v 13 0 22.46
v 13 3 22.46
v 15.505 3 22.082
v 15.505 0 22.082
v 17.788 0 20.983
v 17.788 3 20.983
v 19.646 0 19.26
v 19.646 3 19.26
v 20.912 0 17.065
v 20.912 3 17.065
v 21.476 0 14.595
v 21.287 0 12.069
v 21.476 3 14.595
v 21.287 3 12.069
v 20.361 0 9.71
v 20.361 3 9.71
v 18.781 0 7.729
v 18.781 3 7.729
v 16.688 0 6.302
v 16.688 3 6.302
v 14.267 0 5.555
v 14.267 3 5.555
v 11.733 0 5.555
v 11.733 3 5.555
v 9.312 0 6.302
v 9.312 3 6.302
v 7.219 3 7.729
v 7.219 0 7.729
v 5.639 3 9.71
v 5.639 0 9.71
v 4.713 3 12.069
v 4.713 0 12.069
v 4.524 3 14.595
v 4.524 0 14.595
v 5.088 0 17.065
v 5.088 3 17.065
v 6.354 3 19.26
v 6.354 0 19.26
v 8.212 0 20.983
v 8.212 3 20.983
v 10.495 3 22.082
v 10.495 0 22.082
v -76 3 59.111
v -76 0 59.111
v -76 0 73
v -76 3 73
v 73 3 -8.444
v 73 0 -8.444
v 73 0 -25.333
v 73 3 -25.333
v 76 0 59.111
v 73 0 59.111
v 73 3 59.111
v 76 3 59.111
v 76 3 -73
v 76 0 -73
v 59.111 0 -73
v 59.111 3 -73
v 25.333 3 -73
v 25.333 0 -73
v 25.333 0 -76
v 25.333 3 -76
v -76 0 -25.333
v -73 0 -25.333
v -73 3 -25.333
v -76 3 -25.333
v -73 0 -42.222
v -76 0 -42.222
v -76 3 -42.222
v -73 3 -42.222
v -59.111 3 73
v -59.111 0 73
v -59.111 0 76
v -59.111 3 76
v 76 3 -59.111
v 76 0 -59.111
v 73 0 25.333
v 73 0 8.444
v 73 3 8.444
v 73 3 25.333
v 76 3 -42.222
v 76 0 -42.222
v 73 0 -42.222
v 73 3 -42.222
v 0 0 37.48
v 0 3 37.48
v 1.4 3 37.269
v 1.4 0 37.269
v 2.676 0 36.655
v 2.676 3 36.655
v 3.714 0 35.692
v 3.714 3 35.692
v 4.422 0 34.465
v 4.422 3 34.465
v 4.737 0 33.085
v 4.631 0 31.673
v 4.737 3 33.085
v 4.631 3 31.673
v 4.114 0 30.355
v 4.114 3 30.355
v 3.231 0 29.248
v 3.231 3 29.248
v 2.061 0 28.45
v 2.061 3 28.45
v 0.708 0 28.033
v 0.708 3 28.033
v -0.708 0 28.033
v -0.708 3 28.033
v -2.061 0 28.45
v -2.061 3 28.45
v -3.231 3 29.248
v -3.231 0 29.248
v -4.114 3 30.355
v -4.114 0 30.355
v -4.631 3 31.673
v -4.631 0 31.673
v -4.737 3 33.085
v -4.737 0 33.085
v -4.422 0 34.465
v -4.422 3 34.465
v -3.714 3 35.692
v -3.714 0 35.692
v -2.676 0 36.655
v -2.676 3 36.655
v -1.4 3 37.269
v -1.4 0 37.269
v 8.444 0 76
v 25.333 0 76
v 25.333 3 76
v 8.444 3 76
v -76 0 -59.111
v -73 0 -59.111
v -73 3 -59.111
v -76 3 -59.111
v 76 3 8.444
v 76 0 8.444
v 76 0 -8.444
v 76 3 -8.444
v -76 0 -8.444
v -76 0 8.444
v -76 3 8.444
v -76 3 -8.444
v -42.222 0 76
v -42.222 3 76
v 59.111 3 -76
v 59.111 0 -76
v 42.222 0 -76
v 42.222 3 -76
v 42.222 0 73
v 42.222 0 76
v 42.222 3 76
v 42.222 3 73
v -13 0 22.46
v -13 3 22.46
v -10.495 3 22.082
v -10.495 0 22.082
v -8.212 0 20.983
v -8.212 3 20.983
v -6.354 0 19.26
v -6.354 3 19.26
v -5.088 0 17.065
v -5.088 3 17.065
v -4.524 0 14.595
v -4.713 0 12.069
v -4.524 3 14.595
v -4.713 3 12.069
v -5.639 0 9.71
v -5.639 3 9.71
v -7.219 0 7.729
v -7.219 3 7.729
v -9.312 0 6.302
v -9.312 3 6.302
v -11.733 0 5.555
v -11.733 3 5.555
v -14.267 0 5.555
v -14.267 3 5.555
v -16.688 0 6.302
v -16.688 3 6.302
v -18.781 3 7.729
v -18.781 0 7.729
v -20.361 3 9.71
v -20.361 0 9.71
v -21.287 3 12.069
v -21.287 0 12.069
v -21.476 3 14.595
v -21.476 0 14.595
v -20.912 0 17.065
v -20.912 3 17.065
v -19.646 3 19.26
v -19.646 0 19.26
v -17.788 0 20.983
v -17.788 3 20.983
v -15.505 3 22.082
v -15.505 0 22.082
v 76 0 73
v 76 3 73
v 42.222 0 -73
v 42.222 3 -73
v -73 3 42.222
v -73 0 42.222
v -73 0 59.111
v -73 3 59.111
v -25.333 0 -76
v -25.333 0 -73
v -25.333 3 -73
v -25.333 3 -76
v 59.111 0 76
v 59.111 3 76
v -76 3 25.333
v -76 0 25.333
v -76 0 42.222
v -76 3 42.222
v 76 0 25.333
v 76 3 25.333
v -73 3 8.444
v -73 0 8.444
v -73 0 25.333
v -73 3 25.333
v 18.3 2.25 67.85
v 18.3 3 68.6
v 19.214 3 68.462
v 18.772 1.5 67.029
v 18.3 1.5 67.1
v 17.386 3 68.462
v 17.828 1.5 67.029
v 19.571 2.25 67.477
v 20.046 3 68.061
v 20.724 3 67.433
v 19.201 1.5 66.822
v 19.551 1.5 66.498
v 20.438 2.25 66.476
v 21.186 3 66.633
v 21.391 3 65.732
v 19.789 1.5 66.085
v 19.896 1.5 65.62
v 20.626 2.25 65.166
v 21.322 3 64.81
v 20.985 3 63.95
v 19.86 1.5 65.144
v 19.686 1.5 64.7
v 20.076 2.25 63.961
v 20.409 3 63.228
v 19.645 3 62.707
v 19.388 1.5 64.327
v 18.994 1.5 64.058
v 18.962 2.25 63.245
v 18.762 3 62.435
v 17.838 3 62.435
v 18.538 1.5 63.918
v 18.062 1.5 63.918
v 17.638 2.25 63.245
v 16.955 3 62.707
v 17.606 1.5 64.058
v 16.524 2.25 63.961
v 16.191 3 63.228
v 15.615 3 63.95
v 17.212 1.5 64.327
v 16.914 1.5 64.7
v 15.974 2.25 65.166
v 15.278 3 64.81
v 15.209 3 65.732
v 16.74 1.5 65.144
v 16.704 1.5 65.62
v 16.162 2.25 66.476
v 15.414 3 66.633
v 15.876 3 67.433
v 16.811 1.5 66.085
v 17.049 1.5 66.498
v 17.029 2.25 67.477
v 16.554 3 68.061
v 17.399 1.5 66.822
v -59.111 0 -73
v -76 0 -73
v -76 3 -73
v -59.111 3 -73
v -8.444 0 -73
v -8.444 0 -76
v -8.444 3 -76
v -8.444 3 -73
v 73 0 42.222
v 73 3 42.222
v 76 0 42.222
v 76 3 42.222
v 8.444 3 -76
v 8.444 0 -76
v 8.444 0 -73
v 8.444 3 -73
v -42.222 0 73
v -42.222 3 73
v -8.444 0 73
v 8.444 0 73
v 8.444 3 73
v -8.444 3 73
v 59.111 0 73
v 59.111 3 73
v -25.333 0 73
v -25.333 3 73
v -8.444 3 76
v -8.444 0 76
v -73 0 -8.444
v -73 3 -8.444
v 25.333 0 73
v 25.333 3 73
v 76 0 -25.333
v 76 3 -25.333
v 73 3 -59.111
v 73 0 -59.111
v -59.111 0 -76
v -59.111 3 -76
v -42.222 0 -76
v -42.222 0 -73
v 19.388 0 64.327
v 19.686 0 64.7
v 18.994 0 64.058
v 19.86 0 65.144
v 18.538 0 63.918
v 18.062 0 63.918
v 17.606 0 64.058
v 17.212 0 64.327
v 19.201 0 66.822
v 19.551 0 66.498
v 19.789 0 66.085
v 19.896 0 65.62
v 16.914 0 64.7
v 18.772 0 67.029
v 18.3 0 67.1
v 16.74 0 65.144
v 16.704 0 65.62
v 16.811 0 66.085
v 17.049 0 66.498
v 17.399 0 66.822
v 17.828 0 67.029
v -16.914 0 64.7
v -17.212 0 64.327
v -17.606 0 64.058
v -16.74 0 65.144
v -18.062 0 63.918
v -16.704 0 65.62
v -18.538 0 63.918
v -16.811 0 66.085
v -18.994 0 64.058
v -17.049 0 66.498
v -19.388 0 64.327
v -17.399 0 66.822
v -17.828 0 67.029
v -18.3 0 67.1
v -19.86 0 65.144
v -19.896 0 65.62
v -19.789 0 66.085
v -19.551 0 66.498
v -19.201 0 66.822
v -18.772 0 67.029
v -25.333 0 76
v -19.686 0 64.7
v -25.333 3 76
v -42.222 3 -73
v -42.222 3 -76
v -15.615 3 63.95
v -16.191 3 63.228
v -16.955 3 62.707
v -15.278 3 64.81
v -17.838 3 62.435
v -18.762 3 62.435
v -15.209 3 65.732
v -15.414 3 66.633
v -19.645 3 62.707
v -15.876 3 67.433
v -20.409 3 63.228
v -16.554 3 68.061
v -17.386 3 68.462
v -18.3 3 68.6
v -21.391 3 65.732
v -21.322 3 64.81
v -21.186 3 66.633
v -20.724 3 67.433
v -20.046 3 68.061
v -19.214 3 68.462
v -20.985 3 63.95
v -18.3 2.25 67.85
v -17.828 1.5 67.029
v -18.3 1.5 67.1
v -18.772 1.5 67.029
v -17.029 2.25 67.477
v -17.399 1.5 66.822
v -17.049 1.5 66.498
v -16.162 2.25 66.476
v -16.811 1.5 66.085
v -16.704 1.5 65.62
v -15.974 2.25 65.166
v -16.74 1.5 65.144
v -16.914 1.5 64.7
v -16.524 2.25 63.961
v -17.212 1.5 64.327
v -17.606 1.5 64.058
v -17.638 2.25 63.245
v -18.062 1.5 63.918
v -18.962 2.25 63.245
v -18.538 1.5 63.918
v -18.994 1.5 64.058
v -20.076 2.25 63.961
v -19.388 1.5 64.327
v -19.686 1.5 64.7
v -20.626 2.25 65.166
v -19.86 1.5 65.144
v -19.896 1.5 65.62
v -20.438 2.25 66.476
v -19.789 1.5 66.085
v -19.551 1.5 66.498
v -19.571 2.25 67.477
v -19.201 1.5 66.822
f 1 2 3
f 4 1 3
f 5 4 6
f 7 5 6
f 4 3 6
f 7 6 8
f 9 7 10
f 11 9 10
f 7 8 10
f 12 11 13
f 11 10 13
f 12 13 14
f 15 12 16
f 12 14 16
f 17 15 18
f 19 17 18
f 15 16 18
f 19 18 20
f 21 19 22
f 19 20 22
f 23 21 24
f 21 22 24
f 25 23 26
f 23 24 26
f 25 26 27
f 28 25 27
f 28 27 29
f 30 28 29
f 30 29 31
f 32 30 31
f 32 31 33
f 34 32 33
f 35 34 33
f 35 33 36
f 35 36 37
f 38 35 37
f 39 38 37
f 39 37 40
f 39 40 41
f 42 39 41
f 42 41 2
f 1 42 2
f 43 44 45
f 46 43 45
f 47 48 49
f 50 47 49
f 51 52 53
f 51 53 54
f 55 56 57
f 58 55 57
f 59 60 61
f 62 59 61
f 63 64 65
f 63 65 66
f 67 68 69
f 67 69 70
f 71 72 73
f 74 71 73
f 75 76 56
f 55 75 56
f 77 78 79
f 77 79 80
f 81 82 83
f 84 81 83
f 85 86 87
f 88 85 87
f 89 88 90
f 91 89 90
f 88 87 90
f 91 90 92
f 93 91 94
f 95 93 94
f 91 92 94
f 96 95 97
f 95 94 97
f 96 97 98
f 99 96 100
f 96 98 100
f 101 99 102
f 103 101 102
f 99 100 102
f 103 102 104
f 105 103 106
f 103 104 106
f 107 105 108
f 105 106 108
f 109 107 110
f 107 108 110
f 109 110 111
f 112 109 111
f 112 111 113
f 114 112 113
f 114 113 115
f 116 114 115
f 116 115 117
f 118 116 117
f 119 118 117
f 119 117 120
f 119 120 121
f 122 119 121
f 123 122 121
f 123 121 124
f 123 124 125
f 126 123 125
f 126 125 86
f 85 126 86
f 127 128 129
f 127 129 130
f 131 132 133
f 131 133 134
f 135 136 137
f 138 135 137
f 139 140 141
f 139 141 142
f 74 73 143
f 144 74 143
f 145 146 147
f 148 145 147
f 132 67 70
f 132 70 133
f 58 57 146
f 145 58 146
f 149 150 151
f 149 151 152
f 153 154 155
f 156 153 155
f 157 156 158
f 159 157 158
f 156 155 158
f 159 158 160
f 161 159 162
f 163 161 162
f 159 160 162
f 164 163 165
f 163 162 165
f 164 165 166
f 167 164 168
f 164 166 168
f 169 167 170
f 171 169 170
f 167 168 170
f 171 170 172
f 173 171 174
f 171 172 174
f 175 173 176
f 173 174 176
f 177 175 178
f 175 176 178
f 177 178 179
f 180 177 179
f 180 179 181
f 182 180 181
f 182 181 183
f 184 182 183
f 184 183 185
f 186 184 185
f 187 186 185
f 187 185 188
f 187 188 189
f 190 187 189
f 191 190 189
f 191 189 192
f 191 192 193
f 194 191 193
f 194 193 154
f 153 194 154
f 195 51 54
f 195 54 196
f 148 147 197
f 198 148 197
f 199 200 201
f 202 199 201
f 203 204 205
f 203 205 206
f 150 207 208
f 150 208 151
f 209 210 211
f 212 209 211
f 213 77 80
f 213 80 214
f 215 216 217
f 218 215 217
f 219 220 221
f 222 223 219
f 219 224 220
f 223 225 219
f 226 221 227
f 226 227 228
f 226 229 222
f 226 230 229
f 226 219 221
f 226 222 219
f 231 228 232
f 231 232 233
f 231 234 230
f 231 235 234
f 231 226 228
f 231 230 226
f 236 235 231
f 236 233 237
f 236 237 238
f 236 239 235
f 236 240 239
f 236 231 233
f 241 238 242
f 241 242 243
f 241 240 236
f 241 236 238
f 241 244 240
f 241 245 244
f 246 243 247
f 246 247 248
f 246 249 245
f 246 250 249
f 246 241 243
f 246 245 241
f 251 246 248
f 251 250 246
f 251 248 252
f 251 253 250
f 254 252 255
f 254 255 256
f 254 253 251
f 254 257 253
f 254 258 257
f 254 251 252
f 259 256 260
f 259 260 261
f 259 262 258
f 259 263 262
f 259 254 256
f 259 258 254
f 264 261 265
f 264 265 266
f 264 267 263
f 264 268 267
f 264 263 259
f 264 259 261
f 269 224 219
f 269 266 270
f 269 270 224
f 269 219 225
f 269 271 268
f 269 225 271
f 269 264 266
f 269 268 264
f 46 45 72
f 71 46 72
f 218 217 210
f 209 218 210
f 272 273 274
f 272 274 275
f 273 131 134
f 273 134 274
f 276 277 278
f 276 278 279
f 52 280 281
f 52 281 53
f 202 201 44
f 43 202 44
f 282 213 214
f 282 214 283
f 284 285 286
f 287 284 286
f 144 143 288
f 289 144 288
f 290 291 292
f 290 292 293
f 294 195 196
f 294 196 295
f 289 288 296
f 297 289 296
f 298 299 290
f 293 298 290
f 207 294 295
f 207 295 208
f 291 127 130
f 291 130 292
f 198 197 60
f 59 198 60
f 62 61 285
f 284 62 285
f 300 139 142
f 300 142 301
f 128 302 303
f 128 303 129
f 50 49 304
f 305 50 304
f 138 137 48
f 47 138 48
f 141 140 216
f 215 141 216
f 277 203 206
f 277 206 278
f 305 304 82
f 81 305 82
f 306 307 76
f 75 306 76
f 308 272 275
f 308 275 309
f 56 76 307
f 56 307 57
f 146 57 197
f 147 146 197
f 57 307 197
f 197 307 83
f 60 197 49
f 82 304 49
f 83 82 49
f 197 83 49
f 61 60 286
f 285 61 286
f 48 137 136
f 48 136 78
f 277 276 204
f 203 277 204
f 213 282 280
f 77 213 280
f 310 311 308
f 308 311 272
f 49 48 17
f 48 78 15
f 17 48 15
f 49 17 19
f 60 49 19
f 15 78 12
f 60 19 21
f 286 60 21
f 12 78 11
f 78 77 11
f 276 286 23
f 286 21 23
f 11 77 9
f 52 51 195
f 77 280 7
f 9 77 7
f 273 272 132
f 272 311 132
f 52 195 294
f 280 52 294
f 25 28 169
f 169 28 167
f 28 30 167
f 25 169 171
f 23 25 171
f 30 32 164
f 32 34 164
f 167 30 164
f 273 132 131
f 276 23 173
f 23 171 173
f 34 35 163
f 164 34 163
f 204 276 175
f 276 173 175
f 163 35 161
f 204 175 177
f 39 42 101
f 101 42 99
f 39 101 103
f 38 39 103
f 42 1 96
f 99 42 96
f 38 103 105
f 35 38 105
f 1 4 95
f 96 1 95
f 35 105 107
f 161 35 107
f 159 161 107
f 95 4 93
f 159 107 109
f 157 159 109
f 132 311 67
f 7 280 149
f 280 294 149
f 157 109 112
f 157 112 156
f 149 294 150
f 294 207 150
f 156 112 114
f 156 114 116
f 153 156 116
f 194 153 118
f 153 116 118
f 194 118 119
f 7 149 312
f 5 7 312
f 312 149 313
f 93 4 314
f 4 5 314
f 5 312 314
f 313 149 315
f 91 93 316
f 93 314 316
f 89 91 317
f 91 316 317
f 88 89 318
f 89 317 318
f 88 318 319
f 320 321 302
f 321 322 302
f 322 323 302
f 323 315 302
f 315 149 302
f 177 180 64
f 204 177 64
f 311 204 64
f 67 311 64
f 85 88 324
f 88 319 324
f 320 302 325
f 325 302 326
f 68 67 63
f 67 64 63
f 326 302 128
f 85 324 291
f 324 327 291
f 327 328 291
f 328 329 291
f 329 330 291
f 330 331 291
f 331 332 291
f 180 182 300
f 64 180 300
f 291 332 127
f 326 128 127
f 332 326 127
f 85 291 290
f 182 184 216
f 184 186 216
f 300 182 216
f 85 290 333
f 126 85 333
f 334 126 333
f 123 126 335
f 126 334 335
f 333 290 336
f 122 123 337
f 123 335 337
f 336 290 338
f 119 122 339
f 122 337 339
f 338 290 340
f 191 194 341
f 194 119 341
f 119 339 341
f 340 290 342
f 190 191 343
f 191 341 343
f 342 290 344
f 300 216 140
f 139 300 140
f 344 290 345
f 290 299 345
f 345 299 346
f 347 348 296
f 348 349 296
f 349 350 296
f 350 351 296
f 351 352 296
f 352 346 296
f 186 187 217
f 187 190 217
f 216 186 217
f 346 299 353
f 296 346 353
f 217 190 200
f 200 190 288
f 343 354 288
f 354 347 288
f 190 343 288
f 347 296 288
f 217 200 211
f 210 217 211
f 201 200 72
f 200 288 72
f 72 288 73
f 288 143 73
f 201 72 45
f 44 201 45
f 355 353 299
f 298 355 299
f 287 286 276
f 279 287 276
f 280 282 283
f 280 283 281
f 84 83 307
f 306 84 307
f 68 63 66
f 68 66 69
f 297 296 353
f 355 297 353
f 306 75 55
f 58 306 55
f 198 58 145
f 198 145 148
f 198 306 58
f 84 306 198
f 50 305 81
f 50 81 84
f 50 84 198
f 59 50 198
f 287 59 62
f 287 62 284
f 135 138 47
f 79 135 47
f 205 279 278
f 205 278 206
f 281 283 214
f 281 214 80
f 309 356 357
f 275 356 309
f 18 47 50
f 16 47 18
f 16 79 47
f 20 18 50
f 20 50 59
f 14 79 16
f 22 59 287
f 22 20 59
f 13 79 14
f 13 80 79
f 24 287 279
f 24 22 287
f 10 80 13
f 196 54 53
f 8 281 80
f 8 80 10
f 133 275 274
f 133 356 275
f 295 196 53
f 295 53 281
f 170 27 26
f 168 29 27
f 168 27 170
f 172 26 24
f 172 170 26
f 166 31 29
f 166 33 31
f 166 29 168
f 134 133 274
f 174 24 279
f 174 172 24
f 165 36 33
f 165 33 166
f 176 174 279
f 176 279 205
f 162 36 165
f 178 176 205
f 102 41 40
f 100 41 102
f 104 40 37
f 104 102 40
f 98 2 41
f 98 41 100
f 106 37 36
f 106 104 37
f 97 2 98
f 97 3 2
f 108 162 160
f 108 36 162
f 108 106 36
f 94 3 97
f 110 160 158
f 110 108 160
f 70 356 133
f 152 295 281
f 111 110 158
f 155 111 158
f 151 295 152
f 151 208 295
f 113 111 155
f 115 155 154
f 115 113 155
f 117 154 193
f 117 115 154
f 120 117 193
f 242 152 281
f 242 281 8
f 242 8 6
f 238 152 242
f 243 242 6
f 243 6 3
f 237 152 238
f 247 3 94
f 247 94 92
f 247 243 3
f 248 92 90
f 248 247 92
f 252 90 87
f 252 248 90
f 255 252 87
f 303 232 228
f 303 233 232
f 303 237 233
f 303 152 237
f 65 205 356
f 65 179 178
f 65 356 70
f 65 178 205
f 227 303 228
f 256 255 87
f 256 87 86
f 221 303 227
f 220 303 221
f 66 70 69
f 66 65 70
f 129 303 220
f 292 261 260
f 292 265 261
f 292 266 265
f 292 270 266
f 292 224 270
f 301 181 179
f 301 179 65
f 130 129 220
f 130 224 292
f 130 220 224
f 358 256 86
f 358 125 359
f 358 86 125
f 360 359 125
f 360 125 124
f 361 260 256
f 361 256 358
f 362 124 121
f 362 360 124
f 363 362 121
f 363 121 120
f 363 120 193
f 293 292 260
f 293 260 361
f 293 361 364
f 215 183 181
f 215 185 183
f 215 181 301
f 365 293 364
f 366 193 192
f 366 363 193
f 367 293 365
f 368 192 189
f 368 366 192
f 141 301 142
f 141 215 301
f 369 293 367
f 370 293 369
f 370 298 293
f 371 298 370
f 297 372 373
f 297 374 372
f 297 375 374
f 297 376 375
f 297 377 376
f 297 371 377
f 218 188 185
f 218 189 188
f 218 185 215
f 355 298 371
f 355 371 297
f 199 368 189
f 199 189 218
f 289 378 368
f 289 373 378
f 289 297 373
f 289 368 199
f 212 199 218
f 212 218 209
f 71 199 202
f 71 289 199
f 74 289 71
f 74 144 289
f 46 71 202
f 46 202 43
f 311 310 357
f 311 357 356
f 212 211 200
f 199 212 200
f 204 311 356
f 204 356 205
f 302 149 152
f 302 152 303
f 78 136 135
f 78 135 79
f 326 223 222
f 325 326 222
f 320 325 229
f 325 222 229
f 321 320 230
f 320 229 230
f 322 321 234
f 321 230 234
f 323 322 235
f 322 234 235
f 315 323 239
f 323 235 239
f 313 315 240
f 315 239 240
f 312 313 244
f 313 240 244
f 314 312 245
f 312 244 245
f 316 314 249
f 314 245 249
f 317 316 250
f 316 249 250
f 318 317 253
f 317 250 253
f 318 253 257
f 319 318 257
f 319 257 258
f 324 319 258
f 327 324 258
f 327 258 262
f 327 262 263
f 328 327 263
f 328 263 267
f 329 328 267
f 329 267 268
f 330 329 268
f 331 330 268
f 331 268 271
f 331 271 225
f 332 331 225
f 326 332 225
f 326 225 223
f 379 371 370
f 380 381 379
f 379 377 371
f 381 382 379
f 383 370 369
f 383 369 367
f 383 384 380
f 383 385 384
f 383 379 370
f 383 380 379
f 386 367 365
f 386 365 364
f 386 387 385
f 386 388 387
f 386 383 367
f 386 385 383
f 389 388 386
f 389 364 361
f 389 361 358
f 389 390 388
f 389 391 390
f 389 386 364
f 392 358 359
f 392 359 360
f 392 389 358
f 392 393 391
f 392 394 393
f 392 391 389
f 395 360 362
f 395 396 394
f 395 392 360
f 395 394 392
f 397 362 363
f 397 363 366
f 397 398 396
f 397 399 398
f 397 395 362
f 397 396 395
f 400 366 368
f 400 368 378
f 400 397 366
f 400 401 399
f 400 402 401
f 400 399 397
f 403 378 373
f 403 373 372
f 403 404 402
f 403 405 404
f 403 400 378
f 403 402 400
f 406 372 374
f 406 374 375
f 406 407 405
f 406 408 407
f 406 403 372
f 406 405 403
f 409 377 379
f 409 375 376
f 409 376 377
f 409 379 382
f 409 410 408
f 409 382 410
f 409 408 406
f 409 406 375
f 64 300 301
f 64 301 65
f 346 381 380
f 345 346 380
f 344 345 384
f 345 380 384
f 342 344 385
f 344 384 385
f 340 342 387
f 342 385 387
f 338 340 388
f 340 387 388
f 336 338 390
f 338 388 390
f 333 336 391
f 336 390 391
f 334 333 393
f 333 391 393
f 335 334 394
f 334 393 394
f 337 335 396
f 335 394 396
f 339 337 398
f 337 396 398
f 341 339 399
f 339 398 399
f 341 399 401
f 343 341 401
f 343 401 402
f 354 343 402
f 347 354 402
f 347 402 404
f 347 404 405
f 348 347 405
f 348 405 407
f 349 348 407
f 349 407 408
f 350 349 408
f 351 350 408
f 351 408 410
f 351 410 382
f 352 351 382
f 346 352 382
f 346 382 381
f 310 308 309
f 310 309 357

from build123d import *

# Parameters (mm, degrees)
BOSS_EXTRUDE1_DEPTH                      = 3
MIRROR1_AT_THE_SECOND_PLANE_COPY_1_DEPTH = 3
SKETCH2_R                                = 8.5
SKETCH2_R_2                              = 4.75
CUT_EXTRUDE1_DEPTH                       = 108.522090753
SKETCH3_R                                = 1.6
CUT_EXTRUDE2_DEPTH                       = 108.522090753
CHAMFER1_SIZE                            = 1.5


with BuildPart() as part:
    # Sketch1 → Boss-Extrude1 (new body)
    with BuildSketch(Plane(origin=(0, 0, 0), x_dir=(1, 0, 0), z_dir=(0, 1, 0))):
        Polygon((-76, -73), (-59.111111111, -73), (-59.111111111, -76), (-42.222222222, -76), (-42.222222222, -73), (-25.333333333, -73), (-25.333333333, -76), (-8.444444444, -76), (-8.444444444, -73), (0, -73), (0, 0), (-76, 0), (-76, -8.444444444), (-73, -8.444444444), (-73, -25.333333333), (-76, -25.333333333), (-76, -42.222222222), (-73, -42.222222222), (-73, -59.111111111), (-76, -59.111111111), align=None)
    boss_extrude1 = extrude(amount=BOSS_EXTRUDE1_DEPTH)



with BuildPart() as mirror1_1:
    # Mirror1: Boss-Extrude1 across plane
    add(boss_extrude1.mirror(Plane(origin=(0, 0, 0), x_dir=(0, 0, 1), z_dir=(1, 0, 0))))


with BuildPart() as part_1:
    add(part.part)

    add(mirror1_1.part)  # Mirror1 at the second plane merges Mirror1_1
    # Mirror1 at the second plane: Boss-Extrude1 across plane
    add(boss_extrude1.mirror(Plane.XY))

    # Mirror1 at the second plane copy 1 sketc → Mirror1 at the second plane copy 1 (add)
    with BuildSketch(Plane(origin=(0, 0, 0), x_dir=(-1, 0, 0), z_dir=(0, 1, 0))):
        Polygon((-76, -73), (-59.111111111, -73), (-59.111111111, -76), (-42.222222222, -76), (-42.222222222, -73), (-25.333333333, -73), (-25.333333333, -76), (-8.444444444, -76), (-8.444444444, -73), (0, -73), (0, 0), (-76, 0), (-76, -8.444444444), (-73, -8.444444444), (-73, -25.333333333), (-76, -25.333333333), (-76, -42.222222222), (-73, -42.222222222), (-73, -59.111111111), (-76, -59.111111111), align=None)
    extrude(amount=MIRROR1_AT_THE_SECOND_PLANE_COPY_1_DEPTH)

    # Sketch2 → Cut-Extrude1 (cut, through all)
    with BuildSketch(Plane(origin=(0, 3, 0), x_dir=(1, 0, 0), z_dir=(0, 1, 0))):
        with Locations(Location((-13, -13.96, 0), (0, 0, 270))):
            Circle(SKETCH2_R)
        with Locations(Location((13, -13.96, 0), (0, 0, 270))):
            Circle(SKETCH2_R)
        with Locations(Location((0, -32.73, 0), (0, 0, 270))):
            Circle(SKETCH2_R_2)
    extrude(amount=-CUT_EXTRUDE1_DEPTH, mode=Mode.SUBTRACT)

    # Sketch3 → Cut-Extrude2 (cut, through all)
    with BuildSketch(Plane(origin=(0, 3, 0), x_dir=(1, 0, 0), z_dir=(0, 1, 0))):
        with Locations(Location((-18.3, -65.5, 0), (0, 0, 270))):
            Circle(SKETCH3_R)
        with Locations(Location((18.3, -65.5, 0), (0, 0, 270))):
            Circle(SKETCH3_R)
    extrude(amount=-CUT_EXTRUDE2_DEPTH, mode=Mode.SUBTRACT)

    # Chamfer1
    chamfer1_edges = [part_1.edges().sort_by_distance(p)[0] for p in [
        (-18.3, 3, 63.9),
        (18.3, 3, 63.9),
    ]]
    chamfer(chamfer1_edges, length=CHAMFER1_SIZE)


solid = part_1.part
